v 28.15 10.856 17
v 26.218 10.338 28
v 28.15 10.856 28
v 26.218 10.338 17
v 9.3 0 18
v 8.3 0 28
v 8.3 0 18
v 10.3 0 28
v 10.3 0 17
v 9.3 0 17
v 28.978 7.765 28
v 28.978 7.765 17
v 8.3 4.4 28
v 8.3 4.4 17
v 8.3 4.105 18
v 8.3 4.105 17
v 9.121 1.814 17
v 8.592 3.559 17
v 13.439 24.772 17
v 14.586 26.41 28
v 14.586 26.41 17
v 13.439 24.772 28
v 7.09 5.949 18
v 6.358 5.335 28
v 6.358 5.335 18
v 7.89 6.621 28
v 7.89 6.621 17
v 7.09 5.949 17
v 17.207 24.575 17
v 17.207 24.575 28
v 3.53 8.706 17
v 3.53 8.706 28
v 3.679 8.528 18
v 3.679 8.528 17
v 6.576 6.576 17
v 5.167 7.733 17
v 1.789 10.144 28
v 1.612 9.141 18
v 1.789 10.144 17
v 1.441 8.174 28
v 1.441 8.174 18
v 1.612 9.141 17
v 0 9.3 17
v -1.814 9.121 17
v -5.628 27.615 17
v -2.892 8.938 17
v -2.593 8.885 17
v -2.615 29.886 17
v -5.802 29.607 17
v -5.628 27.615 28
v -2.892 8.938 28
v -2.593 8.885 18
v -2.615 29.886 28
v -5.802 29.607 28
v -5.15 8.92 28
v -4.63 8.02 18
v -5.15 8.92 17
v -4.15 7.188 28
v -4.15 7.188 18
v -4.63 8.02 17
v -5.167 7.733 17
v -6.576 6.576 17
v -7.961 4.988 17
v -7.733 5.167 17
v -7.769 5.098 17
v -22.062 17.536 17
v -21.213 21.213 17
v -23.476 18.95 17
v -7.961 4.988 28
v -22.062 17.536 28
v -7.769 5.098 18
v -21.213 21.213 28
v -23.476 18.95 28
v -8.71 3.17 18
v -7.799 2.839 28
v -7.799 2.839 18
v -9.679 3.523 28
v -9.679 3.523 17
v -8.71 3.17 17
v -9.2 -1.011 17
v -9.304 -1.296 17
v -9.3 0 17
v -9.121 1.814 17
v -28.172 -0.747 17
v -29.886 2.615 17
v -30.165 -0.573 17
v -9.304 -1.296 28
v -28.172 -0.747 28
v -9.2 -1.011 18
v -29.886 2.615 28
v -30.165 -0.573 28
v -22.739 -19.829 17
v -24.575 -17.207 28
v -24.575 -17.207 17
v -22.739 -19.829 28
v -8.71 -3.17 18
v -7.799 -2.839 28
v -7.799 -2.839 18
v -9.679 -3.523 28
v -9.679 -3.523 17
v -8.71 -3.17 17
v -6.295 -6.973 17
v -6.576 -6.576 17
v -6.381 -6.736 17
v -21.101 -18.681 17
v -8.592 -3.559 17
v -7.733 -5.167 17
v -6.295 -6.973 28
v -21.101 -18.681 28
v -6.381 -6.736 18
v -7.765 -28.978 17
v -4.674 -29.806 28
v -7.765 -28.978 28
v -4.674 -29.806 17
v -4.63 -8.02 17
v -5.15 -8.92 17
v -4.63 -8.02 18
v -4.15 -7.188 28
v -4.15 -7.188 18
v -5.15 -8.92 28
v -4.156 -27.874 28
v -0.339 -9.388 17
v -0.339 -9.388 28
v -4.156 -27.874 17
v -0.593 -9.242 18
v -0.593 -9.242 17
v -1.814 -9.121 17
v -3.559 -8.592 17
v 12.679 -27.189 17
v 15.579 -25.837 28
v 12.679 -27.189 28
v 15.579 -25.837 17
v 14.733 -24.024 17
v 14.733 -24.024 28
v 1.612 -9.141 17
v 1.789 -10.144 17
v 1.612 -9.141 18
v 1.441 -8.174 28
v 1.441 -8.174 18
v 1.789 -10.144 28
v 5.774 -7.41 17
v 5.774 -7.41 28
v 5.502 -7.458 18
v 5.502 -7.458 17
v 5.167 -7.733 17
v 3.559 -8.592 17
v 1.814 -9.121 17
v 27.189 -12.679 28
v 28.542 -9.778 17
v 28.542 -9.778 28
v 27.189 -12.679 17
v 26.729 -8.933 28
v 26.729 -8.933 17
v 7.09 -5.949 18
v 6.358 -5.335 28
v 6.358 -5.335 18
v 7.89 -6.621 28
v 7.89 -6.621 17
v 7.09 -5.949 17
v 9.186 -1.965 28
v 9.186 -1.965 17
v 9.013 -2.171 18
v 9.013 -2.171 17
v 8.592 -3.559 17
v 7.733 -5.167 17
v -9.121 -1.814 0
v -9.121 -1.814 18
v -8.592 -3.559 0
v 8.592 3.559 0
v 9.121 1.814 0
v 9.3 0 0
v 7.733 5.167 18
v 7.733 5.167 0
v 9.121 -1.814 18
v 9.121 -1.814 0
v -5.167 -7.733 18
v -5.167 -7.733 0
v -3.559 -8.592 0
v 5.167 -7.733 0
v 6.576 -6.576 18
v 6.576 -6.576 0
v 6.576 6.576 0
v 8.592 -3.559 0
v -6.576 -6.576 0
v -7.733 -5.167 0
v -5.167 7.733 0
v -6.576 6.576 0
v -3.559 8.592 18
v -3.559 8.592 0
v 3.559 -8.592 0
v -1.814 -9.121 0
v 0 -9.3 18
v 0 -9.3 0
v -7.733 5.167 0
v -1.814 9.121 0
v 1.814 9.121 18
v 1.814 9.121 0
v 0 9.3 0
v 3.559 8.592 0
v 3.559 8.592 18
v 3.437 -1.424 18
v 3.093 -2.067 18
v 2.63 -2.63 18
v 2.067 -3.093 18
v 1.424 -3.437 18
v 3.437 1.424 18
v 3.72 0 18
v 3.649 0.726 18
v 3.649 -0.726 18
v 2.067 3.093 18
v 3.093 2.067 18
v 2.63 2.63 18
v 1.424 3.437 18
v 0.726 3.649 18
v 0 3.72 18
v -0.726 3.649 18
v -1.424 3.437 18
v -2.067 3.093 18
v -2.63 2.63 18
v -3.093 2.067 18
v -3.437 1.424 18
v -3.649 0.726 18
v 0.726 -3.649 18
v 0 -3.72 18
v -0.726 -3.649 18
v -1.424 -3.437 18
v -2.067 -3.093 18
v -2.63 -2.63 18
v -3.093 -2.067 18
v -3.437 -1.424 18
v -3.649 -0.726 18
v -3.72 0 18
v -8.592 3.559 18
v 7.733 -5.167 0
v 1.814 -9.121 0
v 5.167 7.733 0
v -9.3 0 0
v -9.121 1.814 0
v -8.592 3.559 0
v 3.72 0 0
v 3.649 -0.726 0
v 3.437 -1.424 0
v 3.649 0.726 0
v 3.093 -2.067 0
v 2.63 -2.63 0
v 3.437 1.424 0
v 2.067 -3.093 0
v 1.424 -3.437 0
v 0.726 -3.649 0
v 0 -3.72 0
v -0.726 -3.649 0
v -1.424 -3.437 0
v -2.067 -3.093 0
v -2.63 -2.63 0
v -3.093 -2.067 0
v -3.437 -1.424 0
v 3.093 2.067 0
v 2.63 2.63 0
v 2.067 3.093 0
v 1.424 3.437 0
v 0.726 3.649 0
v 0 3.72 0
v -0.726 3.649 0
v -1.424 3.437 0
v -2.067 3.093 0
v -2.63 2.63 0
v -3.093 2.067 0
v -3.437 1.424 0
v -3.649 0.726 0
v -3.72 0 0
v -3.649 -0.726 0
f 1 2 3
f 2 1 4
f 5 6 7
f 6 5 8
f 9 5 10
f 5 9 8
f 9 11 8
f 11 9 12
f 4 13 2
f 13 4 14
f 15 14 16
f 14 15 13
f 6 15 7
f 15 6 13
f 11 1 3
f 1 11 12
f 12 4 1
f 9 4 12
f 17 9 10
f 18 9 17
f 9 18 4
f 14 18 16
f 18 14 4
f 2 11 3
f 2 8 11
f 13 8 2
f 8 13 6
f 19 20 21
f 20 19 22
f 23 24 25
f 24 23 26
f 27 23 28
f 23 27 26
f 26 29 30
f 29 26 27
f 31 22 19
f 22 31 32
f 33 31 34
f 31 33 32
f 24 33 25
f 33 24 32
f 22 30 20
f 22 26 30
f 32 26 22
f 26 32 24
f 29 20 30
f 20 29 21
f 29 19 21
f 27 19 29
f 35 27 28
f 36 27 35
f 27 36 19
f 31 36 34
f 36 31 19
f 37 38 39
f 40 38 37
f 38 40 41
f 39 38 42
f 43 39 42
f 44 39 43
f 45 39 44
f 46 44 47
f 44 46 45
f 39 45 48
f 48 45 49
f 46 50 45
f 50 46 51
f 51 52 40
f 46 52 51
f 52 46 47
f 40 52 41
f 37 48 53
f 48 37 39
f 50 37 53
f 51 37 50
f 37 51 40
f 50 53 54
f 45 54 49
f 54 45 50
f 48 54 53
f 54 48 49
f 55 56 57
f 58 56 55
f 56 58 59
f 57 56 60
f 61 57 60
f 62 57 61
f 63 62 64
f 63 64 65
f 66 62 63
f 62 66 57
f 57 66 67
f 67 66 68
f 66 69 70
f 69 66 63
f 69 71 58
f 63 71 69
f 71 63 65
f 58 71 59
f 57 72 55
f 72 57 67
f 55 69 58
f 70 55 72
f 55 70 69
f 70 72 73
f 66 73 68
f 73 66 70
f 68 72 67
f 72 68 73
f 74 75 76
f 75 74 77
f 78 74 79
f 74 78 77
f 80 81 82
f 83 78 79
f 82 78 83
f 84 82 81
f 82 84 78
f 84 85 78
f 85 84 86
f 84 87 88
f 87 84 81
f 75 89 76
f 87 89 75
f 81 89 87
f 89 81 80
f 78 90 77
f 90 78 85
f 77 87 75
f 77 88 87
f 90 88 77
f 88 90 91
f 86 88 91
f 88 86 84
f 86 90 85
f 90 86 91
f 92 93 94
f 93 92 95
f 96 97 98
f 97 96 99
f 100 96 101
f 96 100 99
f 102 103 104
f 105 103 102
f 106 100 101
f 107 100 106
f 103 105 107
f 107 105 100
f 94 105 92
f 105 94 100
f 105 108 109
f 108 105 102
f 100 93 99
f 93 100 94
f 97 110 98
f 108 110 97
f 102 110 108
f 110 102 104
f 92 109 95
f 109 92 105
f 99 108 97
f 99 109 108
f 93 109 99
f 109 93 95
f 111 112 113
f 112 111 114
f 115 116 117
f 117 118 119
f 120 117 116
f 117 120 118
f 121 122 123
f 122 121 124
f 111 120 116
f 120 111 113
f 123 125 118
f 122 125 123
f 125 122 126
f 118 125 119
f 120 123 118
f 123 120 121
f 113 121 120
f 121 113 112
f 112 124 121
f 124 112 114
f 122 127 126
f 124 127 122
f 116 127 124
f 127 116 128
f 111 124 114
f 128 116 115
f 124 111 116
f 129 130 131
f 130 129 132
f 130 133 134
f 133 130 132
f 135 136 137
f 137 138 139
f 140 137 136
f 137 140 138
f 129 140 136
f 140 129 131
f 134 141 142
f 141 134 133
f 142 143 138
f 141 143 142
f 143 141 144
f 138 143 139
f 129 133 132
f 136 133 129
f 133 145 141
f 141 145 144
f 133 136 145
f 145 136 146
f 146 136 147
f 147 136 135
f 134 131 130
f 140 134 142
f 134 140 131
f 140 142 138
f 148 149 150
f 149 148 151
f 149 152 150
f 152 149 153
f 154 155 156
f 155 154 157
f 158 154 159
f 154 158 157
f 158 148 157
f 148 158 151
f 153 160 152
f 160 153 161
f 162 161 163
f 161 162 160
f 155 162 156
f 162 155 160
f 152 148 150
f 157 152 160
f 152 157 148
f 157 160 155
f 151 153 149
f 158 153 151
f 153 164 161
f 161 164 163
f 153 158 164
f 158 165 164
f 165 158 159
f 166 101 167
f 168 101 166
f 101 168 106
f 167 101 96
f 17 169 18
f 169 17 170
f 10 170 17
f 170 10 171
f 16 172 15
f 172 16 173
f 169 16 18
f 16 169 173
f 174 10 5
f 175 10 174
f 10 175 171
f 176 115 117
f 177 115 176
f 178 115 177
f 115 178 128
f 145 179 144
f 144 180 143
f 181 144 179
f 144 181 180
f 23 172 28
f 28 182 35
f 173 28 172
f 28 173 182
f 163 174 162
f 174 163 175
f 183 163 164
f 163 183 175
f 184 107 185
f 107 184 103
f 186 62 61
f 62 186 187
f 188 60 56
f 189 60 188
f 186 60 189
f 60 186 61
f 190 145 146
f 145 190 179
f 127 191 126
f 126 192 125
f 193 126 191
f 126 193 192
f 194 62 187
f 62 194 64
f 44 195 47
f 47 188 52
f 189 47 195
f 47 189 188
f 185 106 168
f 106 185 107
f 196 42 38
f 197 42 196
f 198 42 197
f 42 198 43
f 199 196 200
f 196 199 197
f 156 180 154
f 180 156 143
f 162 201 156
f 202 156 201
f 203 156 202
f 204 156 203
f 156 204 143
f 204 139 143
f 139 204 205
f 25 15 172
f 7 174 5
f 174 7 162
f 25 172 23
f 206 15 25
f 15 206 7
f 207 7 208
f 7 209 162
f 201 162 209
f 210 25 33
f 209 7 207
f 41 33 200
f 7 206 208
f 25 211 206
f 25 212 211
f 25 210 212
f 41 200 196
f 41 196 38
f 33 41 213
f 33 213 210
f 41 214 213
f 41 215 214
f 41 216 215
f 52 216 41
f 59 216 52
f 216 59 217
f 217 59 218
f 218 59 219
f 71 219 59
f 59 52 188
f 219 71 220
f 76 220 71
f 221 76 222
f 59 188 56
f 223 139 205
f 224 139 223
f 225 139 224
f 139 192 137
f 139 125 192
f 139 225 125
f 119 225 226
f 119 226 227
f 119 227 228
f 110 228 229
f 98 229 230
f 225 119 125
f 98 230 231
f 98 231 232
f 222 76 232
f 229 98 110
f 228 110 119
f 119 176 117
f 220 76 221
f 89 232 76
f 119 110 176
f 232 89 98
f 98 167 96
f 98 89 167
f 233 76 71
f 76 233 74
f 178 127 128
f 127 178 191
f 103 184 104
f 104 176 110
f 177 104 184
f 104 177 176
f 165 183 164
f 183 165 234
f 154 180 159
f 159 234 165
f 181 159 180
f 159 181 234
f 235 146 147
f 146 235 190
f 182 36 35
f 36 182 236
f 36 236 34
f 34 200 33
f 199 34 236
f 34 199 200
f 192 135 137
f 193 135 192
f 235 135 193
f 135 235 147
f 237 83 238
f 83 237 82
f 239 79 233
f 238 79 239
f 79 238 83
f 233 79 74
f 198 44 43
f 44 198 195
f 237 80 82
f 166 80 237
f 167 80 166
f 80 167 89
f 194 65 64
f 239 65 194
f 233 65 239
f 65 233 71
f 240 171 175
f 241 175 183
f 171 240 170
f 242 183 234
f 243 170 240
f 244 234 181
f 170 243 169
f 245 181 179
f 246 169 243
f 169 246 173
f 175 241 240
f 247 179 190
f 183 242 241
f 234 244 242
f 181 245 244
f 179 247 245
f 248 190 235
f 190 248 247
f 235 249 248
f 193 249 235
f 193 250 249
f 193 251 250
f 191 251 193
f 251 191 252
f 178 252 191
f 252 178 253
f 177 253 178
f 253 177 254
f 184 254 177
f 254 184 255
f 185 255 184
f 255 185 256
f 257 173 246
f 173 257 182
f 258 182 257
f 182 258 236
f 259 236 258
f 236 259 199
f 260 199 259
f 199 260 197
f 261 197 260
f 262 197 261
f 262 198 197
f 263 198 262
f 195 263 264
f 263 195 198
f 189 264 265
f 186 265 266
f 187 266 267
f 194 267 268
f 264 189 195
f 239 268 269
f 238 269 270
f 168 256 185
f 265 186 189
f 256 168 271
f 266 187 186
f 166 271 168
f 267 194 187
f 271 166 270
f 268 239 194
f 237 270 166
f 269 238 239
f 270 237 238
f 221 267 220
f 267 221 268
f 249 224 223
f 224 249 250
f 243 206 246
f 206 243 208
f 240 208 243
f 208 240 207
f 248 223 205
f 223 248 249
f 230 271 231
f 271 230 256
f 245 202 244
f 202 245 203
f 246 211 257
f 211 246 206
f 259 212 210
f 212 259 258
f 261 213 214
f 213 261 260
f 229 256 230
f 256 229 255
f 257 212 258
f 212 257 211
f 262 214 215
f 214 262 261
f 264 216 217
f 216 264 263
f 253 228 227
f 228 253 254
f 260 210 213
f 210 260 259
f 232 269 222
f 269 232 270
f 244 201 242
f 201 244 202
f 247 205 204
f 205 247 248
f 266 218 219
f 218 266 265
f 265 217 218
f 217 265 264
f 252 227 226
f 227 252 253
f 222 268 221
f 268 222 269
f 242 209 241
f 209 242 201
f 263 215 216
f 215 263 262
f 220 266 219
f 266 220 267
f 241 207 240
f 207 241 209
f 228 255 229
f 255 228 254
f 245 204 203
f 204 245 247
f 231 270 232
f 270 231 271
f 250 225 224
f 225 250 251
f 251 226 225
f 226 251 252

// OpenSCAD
$fn = 32;

// ----------------------------------------------------------------------
// Impeller: 60 mm, 9 blades, 28 mm tall
// ----------------------------------------------------------------------

// --- parameters (mm) ---
hub_d = 18.6;             // hub diameter
hub_h = 18;               // hub height
imp_d = 60;               // outer diameter over the blades
blades = 9;               // number of blades
blade_t = 2;              // blade thickness
blade_h = 10;             // blade height
blade_in_r = 8.3;         // blade root radius
blade_out_r = 28;         // blade tip radius
sweep = 15;               // blade sweep, degrees
bore_d = 7.44;            // shaft bore

module hub() {
  cylinder(h = hub_h, d = hub_d);
}

module blade() {
  /* blade swept between two boxes: hull of the root and the tip section */
  hull() {
    translate([blade_in_r, 0, hub_h - 1])
      cube([blade_t, blade_t * 2.2, blade_h + 1], center = false);
    rotate([0, 0, sweep])
      translate([blade_out_r, 0, hub_h - 1])
        cube([blade_t, blade_t * 1.6, blade_h + 1], center = false);
  }
}

module blades() {
  for (i = [0 : blades - 1])
    rotate([0, 0, i * 360 / blades]) blade();
}

difference() {
  union() {
    hub();
    blades();
  }
  translate([0, 0, -1]) cylinder(h = hub_h + blade_h + 0 + 3, d = bore_d);
}
